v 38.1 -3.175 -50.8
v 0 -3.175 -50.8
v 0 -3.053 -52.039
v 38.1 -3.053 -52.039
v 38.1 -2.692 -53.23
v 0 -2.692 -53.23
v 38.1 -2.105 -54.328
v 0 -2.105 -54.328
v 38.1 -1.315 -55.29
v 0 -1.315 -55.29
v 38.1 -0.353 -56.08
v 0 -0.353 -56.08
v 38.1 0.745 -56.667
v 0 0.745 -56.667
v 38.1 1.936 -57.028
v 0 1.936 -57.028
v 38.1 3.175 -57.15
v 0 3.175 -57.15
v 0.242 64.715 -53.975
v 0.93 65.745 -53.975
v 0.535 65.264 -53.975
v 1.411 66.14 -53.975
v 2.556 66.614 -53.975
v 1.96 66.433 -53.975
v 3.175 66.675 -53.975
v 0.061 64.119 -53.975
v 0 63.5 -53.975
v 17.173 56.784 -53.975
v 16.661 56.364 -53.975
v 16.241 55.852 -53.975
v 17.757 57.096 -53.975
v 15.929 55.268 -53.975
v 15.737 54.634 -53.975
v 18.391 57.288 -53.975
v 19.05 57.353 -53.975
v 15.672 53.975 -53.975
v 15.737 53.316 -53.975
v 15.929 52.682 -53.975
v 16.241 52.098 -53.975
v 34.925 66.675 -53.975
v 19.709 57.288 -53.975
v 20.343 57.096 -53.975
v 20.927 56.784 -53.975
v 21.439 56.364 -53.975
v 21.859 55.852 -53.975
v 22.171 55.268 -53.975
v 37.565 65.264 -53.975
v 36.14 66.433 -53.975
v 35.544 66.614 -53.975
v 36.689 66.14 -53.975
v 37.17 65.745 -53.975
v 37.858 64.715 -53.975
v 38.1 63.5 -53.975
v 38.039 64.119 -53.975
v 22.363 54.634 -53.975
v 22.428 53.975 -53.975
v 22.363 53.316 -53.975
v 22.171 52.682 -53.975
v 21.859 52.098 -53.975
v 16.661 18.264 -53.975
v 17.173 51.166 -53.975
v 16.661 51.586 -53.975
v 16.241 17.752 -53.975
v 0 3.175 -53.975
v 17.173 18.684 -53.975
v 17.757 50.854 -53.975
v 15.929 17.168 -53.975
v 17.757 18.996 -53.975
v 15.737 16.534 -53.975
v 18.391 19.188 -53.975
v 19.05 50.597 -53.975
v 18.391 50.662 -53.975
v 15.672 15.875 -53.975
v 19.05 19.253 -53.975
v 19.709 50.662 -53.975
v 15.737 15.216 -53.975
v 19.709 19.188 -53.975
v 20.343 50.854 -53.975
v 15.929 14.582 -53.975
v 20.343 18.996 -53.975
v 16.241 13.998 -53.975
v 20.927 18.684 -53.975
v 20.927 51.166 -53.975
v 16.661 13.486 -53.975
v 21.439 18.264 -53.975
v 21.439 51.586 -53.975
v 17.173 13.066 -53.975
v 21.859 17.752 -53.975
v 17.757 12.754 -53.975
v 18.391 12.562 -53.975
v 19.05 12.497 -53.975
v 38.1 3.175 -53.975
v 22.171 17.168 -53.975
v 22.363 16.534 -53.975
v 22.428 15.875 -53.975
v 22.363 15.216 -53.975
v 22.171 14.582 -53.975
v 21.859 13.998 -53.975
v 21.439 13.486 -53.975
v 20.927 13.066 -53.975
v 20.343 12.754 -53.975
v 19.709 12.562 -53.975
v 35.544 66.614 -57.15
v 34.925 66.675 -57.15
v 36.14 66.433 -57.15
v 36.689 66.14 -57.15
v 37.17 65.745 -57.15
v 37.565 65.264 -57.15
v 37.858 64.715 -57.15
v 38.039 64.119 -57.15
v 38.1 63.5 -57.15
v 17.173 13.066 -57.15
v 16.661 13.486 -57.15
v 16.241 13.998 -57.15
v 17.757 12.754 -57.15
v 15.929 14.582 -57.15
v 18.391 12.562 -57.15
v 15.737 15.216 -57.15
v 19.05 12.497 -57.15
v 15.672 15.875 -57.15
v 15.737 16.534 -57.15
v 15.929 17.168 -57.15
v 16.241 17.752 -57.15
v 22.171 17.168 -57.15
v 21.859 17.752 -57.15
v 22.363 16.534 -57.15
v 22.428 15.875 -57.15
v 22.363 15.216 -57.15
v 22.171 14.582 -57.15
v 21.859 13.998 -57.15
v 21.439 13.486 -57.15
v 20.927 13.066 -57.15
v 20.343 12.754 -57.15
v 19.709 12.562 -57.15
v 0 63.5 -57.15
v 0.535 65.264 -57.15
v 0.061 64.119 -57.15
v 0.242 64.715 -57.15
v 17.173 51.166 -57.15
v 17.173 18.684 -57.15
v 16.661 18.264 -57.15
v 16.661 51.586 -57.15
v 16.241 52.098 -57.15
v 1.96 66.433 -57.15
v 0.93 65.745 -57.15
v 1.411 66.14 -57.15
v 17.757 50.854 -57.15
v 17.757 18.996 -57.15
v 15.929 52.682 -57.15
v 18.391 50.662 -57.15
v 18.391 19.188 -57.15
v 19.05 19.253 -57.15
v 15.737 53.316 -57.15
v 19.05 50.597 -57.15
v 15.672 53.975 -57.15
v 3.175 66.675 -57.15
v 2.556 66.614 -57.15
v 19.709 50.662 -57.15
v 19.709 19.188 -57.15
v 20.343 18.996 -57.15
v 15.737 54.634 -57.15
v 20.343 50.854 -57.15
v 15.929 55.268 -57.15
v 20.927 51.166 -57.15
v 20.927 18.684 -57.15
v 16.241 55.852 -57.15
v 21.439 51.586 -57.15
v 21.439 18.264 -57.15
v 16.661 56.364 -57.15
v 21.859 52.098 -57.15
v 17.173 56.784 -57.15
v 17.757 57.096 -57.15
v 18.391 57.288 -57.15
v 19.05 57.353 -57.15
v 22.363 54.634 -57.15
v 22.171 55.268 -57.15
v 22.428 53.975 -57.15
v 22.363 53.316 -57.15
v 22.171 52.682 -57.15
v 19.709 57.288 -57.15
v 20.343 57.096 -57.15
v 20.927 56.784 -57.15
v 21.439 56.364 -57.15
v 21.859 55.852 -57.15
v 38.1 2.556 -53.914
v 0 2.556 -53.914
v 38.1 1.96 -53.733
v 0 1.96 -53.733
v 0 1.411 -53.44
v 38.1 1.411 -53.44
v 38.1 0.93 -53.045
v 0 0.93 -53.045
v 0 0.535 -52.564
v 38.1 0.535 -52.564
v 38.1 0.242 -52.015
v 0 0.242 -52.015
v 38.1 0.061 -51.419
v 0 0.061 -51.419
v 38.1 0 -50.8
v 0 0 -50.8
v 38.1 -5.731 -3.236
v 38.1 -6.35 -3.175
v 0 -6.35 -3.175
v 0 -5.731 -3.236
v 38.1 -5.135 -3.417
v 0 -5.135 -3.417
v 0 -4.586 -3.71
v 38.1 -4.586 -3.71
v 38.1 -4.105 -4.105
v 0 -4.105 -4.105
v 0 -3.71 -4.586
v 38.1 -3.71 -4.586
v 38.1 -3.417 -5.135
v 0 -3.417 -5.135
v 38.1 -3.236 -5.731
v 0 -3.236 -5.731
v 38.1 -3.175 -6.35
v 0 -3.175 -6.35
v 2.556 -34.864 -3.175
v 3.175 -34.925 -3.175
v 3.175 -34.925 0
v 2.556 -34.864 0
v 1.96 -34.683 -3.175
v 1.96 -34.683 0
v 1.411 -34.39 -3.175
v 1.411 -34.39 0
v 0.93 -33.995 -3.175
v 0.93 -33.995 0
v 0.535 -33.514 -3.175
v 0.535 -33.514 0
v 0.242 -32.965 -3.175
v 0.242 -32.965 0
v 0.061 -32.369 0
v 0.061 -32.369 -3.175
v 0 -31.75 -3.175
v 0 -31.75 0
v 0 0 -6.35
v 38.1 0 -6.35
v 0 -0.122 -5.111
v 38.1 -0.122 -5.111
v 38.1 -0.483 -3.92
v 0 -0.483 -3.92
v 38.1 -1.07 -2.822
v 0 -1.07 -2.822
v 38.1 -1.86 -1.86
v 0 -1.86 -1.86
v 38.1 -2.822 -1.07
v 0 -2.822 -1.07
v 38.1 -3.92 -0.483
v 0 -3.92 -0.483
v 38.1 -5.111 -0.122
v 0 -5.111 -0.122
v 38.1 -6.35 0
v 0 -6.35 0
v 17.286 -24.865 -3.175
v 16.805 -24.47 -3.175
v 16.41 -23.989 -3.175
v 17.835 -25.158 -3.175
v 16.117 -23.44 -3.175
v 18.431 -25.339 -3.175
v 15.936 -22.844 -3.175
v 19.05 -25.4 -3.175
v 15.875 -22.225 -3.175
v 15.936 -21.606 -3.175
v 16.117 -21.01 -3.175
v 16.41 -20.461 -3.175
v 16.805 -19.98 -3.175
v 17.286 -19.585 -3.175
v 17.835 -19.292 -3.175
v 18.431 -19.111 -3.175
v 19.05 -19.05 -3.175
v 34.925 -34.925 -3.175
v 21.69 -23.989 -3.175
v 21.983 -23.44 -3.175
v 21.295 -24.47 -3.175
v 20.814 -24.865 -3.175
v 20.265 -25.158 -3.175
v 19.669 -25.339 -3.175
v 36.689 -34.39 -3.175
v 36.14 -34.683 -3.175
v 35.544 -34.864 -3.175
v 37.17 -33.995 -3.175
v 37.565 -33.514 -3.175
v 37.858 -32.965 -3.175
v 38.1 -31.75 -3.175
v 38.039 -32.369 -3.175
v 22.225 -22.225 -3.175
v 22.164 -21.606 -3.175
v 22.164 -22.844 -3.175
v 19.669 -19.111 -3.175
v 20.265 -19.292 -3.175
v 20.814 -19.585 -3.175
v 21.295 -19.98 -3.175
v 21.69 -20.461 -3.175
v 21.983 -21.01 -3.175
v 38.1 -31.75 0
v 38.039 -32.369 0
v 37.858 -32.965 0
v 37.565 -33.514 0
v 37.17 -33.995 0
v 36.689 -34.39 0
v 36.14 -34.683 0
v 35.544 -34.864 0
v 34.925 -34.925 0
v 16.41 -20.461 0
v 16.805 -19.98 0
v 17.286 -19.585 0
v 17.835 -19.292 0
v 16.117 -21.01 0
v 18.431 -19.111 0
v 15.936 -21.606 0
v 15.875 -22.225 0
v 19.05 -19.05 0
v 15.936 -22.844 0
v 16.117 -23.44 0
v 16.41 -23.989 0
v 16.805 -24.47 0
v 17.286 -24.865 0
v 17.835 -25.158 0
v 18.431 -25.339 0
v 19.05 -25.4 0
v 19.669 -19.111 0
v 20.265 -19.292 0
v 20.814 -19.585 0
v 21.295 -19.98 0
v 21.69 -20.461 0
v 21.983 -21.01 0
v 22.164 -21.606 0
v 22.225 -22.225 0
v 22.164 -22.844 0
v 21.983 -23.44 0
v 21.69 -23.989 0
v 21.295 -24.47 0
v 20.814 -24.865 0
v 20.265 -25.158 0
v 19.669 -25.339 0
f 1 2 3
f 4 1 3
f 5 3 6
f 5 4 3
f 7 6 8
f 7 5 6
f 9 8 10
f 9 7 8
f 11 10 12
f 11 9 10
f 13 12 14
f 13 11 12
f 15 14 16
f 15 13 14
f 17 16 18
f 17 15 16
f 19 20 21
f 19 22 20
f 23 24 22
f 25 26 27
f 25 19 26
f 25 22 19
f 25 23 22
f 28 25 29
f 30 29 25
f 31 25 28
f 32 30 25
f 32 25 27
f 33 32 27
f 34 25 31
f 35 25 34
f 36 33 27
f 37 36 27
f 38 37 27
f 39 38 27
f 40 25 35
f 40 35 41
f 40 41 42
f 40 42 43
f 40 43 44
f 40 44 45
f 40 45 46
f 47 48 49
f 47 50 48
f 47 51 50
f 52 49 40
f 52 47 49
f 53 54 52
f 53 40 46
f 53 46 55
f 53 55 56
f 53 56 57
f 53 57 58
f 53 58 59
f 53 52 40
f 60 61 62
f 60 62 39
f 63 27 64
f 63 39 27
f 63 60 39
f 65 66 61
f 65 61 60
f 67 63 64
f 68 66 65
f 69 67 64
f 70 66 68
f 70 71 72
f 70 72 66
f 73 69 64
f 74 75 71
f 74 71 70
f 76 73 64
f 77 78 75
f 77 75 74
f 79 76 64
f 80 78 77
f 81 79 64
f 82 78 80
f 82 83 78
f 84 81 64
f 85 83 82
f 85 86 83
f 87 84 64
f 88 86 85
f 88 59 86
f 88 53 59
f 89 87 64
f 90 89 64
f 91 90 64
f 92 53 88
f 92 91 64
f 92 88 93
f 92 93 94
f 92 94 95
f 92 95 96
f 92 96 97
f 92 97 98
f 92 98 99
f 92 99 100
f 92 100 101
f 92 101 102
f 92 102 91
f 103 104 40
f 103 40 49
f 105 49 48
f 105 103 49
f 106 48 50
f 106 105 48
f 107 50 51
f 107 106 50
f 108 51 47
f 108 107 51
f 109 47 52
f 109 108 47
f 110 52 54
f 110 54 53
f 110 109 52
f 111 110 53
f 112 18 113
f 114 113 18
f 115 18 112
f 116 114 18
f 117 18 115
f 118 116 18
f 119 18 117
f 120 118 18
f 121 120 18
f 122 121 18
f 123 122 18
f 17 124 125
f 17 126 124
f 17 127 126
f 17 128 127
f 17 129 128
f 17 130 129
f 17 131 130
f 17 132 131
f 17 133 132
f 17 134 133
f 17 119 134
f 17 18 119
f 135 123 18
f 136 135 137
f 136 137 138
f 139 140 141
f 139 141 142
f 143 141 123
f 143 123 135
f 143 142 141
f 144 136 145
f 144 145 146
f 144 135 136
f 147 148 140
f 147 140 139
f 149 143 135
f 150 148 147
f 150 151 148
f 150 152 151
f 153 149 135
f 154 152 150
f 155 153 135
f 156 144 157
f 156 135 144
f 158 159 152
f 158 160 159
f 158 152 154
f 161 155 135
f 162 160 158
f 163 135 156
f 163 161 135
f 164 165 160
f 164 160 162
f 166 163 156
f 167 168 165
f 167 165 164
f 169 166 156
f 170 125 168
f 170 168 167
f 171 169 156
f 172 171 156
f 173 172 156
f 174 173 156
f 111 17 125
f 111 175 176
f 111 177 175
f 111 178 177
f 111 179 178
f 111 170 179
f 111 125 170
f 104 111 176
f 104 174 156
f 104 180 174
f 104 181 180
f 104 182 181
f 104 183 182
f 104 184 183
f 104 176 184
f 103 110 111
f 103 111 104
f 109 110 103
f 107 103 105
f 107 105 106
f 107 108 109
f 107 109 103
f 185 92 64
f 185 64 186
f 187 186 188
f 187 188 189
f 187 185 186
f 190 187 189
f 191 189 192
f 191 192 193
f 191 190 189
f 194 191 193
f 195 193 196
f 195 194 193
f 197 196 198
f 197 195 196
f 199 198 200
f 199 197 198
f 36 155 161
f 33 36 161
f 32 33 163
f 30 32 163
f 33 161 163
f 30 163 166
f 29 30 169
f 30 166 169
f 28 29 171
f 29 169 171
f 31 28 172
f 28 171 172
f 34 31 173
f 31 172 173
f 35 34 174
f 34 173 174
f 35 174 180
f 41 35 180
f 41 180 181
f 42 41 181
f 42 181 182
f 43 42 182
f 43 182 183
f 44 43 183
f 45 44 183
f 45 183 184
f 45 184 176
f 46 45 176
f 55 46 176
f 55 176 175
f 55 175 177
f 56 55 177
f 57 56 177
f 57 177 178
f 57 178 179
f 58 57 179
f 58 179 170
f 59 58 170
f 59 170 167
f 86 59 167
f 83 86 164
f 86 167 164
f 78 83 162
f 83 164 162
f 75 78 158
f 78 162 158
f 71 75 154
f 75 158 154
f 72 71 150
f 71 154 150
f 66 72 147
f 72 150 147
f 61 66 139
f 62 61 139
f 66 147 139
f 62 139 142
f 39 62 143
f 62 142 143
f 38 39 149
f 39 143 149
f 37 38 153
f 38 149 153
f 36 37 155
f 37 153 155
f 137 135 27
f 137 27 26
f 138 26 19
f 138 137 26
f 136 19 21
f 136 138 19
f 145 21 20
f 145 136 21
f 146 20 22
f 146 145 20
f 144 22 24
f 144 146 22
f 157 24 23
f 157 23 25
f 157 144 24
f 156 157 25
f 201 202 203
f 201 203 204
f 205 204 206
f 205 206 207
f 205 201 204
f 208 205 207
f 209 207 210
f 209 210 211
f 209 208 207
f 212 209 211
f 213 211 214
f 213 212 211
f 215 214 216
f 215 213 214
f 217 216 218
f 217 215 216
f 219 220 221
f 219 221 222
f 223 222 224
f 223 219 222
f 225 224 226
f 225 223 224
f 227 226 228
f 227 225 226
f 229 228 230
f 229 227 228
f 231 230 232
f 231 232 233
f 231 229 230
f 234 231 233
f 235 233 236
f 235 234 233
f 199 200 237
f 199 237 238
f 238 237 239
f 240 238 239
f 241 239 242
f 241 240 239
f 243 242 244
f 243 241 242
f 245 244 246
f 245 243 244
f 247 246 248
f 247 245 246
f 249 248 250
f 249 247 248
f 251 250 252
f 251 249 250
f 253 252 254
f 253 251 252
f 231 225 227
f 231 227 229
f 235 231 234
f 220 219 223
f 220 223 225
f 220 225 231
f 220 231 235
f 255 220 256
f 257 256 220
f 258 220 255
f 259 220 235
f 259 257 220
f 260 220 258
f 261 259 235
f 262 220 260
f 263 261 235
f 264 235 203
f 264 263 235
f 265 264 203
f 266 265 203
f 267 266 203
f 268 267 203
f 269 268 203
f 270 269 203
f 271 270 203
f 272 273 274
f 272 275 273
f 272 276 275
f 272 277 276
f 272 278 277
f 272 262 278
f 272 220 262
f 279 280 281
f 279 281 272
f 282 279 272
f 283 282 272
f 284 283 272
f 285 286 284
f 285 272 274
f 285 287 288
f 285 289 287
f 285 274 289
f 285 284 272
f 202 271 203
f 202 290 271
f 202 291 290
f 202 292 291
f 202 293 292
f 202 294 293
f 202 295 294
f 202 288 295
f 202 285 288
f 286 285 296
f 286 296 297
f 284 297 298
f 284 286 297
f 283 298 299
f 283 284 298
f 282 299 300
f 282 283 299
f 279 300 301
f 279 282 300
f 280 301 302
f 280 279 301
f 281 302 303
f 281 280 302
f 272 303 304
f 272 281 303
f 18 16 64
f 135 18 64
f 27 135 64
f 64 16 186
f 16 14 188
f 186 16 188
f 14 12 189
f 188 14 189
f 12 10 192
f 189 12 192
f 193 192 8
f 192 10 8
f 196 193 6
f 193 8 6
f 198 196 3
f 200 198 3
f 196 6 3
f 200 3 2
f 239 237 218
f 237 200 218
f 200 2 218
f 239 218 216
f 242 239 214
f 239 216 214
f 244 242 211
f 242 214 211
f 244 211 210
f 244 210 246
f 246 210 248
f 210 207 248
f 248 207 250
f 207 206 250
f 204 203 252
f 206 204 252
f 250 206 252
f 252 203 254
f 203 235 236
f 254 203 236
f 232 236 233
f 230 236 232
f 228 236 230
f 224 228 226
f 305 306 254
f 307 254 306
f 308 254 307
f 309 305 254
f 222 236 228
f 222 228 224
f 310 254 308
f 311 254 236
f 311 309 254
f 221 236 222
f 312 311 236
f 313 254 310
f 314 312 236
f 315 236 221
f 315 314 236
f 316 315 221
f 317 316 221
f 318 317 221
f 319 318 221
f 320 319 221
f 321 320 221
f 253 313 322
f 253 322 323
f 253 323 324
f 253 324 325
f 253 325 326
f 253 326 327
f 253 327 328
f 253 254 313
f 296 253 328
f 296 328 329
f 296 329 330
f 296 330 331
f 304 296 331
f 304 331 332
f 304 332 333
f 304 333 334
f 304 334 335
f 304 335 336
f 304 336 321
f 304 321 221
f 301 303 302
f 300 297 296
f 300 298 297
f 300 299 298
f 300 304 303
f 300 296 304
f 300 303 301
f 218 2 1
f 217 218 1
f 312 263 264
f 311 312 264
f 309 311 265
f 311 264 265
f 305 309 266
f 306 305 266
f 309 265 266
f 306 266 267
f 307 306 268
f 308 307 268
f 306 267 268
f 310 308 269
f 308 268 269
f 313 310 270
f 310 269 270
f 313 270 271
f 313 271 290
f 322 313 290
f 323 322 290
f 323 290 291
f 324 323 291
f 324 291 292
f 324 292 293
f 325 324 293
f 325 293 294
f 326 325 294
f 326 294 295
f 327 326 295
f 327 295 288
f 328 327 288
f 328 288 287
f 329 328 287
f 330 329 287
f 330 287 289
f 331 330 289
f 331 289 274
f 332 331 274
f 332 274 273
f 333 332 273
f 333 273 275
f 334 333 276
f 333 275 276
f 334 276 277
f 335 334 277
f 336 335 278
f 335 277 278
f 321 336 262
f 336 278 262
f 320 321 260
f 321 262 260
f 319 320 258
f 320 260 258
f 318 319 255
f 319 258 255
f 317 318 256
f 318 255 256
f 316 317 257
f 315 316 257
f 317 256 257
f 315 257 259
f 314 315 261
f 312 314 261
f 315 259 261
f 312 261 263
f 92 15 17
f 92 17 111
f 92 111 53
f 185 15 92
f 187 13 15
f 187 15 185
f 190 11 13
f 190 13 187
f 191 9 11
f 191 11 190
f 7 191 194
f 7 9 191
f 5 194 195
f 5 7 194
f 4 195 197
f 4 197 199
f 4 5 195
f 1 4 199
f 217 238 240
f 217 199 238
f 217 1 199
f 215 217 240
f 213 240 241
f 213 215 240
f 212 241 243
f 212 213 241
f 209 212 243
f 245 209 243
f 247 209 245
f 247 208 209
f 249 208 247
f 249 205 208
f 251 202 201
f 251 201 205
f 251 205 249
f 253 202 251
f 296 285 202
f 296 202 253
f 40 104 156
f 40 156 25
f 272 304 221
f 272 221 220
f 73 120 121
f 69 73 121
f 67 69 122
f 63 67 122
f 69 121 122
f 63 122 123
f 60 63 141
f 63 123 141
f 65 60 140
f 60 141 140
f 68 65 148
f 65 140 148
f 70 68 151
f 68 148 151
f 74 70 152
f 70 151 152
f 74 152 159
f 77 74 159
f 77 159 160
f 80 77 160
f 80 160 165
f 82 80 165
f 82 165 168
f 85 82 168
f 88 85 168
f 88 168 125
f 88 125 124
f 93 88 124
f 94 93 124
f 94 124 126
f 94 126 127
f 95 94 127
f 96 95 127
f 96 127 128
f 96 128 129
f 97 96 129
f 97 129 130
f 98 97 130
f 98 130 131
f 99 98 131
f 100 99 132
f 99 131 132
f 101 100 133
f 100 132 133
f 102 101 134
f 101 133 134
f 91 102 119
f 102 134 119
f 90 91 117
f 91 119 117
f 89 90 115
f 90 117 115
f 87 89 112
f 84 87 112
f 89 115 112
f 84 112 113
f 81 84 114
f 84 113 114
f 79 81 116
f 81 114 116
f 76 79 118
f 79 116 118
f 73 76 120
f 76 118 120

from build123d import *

# Parameters (mm, degrees)
SKETCH1_W                    = 38.1
SKETCH1_H                    = 57.15
BASE_FLANGE1_DEPTH           = 3.175
EDGE_FLANGE1_STRIP_W         = 19.05
EDGE_FLANGE1_STRIP_H         = 3.175
EDGE_FLANGE1_STRIP_CUT_DEPTH = 38.1
EDGE_FLANGE1_DEPTH           = 38.1
EDGE_FLANGE2_STRIP_W         = 19.05
EDGE_FLANGE2_STRIP_H         = 3.175
EDGE_FLANGE2_STRIP_CUT_DEPTH = 38.1
EDGE_FLANGE2_DEPTH           = 38.1
F_1_4_CLEARANCE_HOLE1_D      = 6.7564
F_1_4_20_TAPPED_HOLE1_D      = 6.35
BREAK_CORNER1_START          = -57.15
BREAK_CORNER1_DEPTH          = 57.15


# Read off the part's stored shape, not the designer's step: Break-Corner1
# Sheet-metal steps are written as plain solids
with BuildPart() as part:
    # Sketch1 → Base-Flange1 (new body)
    with BuildSketch(Plane(origin=(0, 0, 0), x_dir=(1, 0, 0), z_dir=(0, 1, 0))):
        with Locations((19.05, 28.575)):
            Rectangle(SKETCH1_W, SKETCH1_H)
    extrude(amount=-BASE_FLANGE1_DEPTH)

    # Edge-Flange1 strip (across the edge) → Edge-Flange1 strip cut (cut)
    with BuildSketch(Plane(origin=(38.1, 0, -57.15), x_dir=(0, 0, 1), z_dir=(-1, 0, 0))):
        with Locations((-3.175, -1.5875)):
            Rectangle(EDGE_FLANGE1_STRIP_W, EDGE_FLANGE1_STRIP_H)
    extrude(amount=EDGE_FLANGE1_STRIP_CUT_DEPTH, mode=Mode.SUBTRACT)

    # Edge-Flange1 section (across the edge) → Edge-Flange1 (add)
    with BuildSketch(Plane(origin=(38.1, 0, -57.15), x_dir=(0, 0, 1), z_dir=(-1, 0, 0))):
        with BuildLine():
            Line((0, 3.175), (0, 66.675))
            Line((0, 66.675), (3.175, 66.675))
            Line((3.175, 66.675), (3.175, 3.175))
            ThreePointArc((3.175, 3.175), (4.10493597, 0.92993597), (6.35, 0))
            Line((6.35, 0), (6.35, -3.175))
            ThreePointArc((6.35, -3.175), (1.859871939, -1.315128061), (0, 3.175))
        make_face()
    extrude(amount=EDGE_FLANGE1_DEPTH)

    # Edge-Flange2 strip (across the edge) → Edge-Flange2 strip cut (cut)
    with BuildSketch(Plane(origin=(38.1, -3.175, 0), x_dir=(0, 0, -1), z_dir=(-1, 0, 0))):
        with Locations((-3.175, -1.5875)):
            Rectangle(EDGE_FLANGE2_STRIP_W, EDGE_FLANGE2_STRIP_H)
    extrude(amount=EDGE_FLANGE2_STRIP_CUT_DEPTH, mode=Mode.SUBTRACT)

    # Edge-Flange2 section (across the edge) → Edge-Flange2 (add)
    with BuildSketch(Plane(origin=(38.1, -3.175, 0), x_dir=(0, 0, -1), z_dir=(-1, 0, 0))):
        with BuildLine():
            Line((0, 3.175), (0, 31.75))
            Line((0, 31.75), (3.175, 31.75))
            Line((3.175, 31.75), (3.175, 3.175))
            ThreePointArc((3.175, 3.175), (4.10493597, 0.92993597), (6.35, 0))
            Line((6.35, 0), (6.35, -3.175))
            ThreePointArc((6.35, -3.175), (1.859871939, -1.315128061), (0, 3.175))
        make_face()
    extrude(amount=EDGE_FLANGE2_DEPTH)

    # 1/4 Clearance Hole1 (through all)
    with Locations(Plane.XY.offset(-53.975)):
        with Locations((19.05, 53.975), (19.05, 15.875)):
            Hole(F_1_4_CLEARANCE_HOLE1_D / 2)

    # 1/4-20 Tapped Hole1 (through all)
    with Locations(Plane.XY):
        with Locations((19.05, -22.225)):
            Hole(F_1_4_20_TAPPED_HOLE1_D / 2)

    # Break-Corner1 outline → Break-Corner1 (cut)
    with BuildSketch(Plane.XY.offset(BREAK_CORNER1_START)):
        with BuildLine():
            Line((38.1, -34.925), (38.1, -31.75))
            ThreePointArc((38.1, -31.75), (37.17006403, -33.99506403), (34.925, -34.925))
            Line((34.925, -34.925), (38.1, -34.925))
        make_face()
        with BuildLine():
            Line((0, -34.925), (3.175, -34.925))
            ThreePointArc((3.175, -34.925), (0.92993597, -33.99506403), (0, -31.75))
            Line((0, -31.75), (0, -34.925))
        make_face()
        with BuildLine():
            ThreePointArc((0, 63.5), (0.92993597, 65.74506403), (3.175, 66.675))
            Line((3.175, 66.675), (0, 66.675))
            Line((0, 66.675), (0, 63.5))
        make_face()
        with BuildLine():
            ThreePointArc((34.925, 66.675), (37.17006403, 65.74506403), (38.1, 63.5))
            Line((38.1, 63.5), (38.1, 66.675))
            Line((38.1, 66.675), (34.925, 66.675))
        make_face()
    extrude(amount=BREAK_CORNER1_DEPTH, mode=Mode.SUBTRACT)


solid = part.part
